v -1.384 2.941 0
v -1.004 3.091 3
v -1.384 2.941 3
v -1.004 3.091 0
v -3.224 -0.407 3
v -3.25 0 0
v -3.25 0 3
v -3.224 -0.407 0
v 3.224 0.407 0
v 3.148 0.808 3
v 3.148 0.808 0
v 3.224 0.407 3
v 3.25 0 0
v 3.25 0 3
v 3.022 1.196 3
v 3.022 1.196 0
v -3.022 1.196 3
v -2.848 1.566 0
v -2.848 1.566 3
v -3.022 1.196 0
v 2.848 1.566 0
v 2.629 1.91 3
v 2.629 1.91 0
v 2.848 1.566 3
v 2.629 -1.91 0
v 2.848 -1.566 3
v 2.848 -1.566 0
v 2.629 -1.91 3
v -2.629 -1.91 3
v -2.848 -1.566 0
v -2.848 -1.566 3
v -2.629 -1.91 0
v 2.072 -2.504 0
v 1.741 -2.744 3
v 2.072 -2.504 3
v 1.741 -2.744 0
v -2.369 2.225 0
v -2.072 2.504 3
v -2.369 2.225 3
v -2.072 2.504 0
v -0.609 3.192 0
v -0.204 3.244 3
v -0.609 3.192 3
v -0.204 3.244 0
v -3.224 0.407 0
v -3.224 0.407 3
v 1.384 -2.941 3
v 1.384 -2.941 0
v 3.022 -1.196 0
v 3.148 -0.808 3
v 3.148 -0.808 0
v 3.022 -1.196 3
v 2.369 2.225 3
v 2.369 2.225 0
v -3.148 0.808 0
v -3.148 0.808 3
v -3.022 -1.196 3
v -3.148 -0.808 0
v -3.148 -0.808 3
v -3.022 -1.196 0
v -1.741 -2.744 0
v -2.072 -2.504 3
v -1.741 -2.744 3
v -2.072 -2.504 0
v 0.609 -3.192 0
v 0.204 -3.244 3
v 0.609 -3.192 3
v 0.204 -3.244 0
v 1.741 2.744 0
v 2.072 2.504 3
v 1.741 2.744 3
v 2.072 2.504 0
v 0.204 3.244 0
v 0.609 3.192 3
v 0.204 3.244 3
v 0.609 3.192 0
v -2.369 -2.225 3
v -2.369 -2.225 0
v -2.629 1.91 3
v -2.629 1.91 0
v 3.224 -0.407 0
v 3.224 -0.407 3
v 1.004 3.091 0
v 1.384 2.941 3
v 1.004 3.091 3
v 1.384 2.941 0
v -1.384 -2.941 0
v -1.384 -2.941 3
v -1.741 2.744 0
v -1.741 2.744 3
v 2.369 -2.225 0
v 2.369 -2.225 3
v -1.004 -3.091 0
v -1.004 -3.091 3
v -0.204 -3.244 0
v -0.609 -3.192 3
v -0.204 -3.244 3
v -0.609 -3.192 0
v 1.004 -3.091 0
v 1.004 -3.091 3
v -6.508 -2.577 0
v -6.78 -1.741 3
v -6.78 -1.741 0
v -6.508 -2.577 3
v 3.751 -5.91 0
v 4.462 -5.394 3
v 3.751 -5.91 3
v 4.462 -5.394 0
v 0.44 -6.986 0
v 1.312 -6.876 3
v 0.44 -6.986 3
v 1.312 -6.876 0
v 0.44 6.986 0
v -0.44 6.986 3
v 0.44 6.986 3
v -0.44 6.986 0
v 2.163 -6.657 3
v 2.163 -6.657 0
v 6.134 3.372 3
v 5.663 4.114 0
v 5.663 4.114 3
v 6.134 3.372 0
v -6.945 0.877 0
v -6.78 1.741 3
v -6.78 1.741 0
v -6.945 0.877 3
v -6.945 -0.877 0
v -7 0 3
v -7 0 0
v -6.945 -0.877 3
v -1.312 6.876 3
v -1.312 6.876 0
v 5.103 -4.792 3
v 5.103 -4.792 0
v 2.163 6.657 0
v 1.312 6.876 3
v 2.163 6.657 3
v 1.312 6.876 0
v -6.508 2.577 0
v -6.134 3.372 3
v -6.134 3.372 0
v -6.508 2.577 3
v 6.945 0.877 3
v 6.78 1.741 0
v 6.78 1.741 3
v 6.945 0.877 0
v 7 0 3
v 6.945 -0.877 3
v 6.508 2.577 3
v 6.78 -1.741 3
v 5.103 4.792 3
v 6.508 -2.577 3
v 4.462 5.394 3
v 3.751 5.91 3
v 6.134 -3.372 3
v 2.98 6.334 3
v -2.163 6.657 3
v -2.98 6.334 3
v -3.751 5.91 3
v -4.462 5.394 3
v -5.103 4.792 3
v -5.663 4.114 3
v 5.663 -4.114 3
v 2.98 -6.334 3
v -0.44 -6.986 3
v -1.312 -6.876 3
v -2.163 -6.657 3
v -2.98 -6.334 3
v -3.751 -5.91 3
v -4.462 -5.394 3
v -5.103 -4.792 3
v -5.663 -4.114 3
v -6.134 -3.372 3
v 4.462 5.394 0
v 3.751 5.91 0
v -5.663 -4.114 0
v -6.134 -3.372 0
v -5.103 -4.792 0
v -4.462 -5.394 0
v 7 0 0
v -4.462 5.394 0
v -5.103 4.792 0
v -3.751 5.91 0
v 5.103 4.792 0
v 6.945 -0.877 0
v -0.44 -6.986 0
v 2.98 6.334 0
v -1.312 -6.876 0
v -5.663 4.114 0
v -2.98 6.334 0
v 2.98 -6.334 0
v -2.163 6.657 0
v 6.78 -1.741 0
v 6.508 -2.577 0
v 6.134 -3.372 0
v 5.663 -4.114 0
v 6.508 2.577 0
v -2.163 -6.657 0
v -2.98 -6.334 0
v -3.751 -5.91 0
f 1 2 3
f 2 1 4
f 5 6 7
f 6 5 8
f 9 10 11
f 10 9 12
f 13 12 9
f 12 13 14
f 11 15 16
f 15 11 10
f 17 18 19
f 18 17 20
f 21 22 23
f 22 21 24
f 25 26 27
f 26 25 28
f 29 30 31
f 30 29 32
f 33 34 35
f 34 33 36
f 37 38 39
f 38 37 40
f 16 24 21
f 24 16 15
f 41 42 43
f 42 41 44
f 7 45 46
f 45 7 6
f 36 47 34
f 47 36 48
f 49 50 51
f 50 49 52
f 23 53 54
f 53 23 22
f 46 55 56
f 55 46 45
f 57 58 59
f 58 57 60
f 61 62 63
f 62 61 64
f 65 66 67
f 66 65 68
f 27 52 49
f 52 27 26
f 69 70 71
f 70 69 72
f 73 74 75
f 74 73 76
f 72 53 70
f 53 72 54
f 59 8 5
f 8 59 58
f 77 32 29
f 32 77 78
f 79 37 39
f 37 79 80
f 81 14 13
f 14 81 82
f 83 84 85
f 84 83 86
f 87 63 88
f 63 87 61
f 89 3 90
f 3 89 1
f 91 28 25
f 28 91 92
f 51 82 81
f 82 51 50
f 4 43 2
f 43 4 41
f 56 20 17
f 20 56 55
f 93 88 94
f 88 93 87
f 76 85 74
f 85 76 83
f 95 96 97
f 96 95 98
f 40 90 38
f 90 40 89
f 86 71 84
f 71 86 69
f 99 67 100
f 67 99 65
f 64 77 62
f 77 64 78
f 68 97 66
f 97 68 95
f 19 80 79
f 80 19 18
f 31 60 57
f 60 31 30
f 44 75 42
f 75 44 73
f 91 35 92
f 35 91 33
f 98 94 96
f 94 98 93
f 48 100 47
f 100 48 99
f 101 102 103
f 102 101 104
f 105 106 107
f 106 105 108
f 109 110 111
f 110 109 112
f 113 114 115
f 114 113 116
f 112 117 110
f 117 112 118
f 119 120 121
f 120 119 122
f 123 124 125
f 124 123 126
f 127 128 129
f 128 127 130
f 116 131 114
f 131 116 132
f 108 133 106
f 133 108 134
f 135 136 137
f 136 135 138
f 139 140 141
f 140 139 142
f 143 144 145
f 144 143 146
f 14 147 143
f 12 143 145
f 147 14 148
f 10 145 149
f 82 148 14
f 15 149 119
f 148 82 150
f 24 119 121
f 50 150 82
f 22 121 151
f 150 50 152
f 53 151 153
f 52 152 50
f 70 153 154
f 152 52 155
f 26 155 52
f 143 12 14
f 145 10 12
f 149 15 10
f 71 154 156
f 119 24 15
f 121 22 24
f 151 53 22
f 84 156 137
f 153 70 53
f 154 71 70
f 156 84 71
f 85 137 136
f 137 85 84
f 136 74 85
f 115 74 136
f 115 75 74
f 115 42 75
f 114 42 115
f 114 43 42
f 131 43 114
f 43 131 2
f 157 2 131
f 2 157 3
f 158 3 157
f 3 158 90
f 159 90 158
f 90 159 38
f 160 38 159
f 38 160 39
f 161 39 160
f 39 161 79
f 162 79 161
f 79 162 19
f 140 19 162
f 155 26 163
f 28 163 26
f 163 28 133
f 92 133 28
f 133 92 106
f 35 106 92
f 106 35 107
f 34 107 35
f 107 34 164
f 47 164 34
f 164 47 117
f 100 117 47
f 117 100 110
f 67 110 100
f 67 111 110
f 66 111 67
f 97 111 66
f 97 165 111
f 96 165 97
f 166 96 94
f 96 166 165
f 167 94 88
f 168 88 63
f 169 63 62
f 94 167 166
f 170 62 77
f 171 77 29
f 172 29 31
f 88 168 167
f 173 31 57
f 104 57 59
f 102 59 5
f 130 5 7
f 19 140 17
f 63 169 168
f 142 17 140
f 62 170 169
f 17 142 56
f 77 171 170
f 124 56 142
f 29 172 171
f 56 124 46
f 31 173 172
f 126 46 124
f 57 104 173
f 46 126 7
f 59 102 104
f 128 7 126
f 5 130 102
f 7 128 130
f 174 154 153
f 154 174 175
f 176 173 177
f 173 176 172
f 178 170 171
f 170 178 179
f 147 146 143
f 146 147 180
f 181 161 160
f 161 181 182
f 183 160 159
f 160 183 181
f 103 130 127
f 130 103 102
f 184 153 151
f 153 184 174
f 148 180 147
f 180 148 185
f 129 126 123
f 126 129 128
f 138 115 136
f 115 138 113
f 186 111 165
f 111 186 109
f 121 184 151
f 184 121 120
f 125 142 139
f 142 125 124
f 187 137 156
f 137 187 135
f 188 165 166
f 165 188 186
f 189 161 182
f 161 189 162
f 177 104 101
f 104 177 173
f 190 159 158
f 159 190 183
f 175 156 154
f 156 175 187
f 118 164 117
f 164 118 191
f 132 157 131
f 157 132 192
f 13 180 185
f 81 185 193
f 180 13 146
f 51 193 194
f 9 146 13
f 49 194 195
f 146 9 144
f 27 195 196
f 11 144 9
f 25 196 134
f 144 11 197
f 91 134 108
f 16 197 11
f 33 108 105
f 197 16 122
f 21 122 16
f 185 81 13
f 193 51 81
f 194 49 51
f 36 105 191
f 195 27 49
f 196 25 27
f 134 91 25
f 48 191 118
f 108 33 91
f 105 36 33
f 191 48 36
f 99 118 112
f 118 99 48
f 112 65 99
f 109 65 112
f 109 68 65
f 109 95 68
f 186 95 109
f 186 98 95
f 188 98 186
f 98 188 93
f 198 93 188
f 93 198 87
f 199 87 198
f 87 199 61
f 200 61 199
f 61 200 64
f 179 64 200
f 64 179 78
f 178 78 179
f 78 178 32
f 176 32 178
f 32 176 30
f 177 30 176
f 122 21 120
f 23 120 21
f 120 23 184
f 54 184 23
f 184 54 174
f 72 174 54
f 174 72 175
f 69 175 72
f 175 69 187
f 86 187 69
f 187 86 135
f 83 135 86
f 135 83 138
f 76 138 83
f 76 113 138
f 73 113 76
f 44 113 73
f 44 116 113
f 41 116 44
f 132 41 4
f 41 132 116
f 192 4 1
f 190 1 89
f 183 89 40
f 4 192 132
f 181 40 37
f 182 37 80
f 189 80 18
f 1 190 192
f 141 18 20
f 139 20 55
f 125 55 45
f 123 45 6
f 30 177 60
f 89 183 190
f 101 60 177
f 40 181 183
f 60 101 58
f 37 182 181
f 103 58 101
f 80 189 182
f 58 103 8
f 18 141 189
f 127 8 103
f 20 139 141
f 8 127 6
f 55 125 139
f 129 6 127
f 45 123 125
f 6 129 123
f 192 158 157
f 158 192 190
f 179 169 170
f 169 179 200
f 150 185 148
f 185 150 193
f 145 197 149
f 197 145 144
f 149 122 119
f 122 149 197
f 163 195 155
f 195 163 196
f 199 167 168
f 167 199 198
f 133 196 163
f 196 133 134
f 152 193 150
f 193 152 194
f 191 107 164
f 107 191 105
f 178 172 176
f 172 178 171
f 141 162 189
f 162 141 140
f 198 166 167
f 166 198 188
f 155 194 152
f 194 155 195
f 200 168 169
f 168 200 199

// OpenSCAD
$fn = 50;


difference() {
	union() {
		translate(v = [0, 0, 0]) {
			rotate(a = [0, 0, 0]) {
				cylinder(h = 3, r = 7.0000000000);
			}
		}
	}
	union() {
		translate(v = [0.0000000000, 0.0000000000, 0]) {
			rotate(a = [0, 0, 0]) {
				translate(v = [0, 0, -50]) {
					rotate(a = [0, 0, 0]) {
						cylinder(h = 100, r = 3.2500000000);
					}
				}
			}
		}
		translate(v = [0.0000000000, 0.0000000000, 0]) {
			rotate(a = [0, 0, 0]) {
				translate(v = [0, 0, -50]) {
					rotate(a = [0, 0, 0]) {
						cylinder(h = 100, r = 1.8000000000);
					}
				}
			}
		}
	}
}
